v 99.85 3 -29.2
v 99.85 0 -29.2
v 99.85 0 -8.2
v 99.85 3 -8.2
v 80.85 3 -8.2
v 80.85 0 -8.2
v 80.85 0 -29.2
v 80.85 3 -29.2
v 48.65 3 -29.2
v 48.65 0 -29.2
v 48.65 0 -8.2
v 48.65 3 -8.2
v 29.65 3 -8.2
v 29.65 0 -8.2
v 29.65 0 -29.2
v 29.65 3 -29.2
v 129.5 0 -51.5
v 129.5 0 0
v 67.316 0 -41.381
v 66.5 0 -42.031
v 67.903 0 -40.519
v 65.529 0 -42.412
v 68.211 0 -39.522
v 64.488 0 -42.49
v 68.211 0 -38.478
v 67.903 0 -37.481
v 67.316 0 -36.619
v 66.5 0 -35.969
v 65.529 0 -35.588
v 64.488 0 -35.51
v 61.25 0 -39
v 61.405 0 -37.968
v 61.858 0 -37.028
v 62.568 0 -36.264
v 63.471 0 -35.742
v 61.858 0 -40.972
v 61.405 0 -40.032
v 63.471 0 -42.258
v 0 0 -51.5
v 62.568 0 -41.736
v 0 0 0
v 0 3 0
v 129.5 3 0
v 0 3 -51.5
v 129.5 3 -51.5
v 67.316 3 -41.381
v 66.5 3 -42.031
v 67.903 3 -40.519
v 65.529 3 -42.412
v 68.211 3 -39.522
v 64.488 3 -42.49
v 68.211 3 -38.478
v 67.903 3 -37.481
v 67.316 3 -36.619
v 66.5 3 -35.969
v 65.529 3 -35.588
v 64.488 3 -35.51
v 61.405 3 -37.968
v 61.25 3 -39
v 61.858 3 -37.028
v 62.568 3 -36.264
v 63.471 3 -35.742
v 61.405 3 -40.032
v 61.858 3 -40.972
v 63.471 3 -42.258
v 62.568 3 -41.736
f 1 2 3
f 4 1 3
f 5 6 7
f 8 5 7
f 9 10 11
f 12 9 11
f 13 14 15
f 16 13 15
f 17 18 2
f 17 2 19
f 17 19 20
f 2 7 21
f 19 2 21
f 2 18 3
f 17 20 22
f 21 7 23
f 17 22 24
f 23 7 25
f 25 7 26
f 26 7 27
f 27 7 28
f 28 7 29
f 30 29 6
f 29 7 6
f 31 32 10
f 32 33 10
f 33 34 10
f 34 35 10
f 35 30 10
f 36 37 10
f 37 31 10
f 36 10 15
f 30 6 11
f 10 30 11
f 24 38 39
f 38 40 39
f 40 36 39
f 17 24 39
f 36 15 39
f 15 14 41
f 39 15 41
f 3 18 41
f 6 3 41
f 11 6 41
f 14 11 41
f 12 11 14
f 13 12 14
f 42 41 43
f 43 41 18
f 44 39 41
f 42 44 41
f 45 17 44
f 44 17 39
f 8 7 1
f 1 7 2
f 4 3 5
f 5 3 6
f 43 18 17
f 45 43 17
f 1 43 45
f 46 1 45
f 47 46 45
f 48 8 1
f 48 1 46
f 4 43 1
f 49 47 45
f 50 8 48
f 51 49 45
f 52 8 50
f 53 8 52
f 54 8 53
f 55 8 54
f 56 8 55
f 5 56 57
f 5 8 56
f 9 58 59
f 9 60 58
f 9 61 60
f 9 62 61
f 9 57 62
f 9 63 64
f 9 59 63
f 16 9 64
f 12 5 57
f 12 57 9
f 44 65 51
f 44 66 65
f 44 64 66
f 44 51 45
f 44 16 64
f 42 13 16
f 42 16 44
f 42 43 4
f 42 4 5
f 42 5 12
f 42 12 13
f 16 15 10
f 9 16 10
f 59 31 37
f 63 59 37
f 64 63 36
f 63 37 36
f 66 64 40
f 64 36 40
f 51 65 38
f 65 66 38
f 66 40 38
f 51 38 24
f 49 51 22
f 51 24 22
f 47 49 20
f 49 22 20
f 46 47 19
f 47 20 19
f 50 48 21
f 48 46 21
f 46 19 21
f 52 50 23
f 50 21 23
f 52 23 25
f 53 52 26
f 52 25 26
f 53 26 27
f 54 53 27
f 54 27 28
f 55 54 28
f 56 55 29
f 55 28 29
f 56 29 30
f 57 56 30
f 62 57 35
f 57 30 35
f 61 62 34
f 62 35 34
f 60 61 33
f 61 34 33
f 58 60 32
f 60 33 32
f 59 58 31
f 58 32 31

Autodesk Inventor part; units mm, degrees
ref_plane "YZ Plane" through (0, 0, 0) normal (1, 0, 0) x (0, 1, 0)
ref_plane "XZ Plane" through (0, 0, 0) normal (0, 1, 0) x (-1, 0, 0)
ref_plane "XY Plane" through (0, 0, 0) normal (0, 0, 1) x (1, 0, 0)
sketch "Skizze1" plane through (0, 0, 0) normal (0, 1, 0) x (-1, 0, 0)
  line L0 (0, 0) -> (-129.5, 0)
  line L1 (-129.5, 0) -> (-129.5, -51.5)
  line L2 (-129.5, -51.5) -> (0, -51.5)
  line L3 (0, -51.5) -> (0, 0)
  line L4 (-29.65, -29.2) -> (-48.65, -29.2)
  line L5 (-48.65, -29.2) -> (-48.65, -8.2)
  line L6 (-48.65, -8.2) -> (-29.65, -8.2)
  line L7 (-29.65, -8.2) -> (-29.65, -29.2)
  line L8 (-80.85, -29.2) -> (-99.85, -29.2)
  line L9 (-99.85, -29.2) -> (-99.85, -8.2)
  line L10 (-99.85, -8.2) -> (-80.85, -8.2)
  line L11 (-80.85, -8.2) -> (-80.85, -29.2)
  line L12 (-48.65, -18.7) -> (-80.85, -18.7) construction
  circle A0 centre (-64.75, -39) radius 3.5
  line L13 (-64.75, -42.5) -> (-64.75, -51.5) construction
  point P0 (-64.75, -18.7)
  point P1 (0, -25.75)
  dimension "d10" = 7
  dimension "d0" = 129.5
  dimension "d4" = 19
  dimension "d5" = 21
  dimension "d7" = 8.2
  dimension "d8" = 51.5
  dimension "d9" = 32.2
  dimension "d11" = 9
extrude "Extrusion1" add sketch "Skizze1" along normal blind 3
properties part number "wood_front"
